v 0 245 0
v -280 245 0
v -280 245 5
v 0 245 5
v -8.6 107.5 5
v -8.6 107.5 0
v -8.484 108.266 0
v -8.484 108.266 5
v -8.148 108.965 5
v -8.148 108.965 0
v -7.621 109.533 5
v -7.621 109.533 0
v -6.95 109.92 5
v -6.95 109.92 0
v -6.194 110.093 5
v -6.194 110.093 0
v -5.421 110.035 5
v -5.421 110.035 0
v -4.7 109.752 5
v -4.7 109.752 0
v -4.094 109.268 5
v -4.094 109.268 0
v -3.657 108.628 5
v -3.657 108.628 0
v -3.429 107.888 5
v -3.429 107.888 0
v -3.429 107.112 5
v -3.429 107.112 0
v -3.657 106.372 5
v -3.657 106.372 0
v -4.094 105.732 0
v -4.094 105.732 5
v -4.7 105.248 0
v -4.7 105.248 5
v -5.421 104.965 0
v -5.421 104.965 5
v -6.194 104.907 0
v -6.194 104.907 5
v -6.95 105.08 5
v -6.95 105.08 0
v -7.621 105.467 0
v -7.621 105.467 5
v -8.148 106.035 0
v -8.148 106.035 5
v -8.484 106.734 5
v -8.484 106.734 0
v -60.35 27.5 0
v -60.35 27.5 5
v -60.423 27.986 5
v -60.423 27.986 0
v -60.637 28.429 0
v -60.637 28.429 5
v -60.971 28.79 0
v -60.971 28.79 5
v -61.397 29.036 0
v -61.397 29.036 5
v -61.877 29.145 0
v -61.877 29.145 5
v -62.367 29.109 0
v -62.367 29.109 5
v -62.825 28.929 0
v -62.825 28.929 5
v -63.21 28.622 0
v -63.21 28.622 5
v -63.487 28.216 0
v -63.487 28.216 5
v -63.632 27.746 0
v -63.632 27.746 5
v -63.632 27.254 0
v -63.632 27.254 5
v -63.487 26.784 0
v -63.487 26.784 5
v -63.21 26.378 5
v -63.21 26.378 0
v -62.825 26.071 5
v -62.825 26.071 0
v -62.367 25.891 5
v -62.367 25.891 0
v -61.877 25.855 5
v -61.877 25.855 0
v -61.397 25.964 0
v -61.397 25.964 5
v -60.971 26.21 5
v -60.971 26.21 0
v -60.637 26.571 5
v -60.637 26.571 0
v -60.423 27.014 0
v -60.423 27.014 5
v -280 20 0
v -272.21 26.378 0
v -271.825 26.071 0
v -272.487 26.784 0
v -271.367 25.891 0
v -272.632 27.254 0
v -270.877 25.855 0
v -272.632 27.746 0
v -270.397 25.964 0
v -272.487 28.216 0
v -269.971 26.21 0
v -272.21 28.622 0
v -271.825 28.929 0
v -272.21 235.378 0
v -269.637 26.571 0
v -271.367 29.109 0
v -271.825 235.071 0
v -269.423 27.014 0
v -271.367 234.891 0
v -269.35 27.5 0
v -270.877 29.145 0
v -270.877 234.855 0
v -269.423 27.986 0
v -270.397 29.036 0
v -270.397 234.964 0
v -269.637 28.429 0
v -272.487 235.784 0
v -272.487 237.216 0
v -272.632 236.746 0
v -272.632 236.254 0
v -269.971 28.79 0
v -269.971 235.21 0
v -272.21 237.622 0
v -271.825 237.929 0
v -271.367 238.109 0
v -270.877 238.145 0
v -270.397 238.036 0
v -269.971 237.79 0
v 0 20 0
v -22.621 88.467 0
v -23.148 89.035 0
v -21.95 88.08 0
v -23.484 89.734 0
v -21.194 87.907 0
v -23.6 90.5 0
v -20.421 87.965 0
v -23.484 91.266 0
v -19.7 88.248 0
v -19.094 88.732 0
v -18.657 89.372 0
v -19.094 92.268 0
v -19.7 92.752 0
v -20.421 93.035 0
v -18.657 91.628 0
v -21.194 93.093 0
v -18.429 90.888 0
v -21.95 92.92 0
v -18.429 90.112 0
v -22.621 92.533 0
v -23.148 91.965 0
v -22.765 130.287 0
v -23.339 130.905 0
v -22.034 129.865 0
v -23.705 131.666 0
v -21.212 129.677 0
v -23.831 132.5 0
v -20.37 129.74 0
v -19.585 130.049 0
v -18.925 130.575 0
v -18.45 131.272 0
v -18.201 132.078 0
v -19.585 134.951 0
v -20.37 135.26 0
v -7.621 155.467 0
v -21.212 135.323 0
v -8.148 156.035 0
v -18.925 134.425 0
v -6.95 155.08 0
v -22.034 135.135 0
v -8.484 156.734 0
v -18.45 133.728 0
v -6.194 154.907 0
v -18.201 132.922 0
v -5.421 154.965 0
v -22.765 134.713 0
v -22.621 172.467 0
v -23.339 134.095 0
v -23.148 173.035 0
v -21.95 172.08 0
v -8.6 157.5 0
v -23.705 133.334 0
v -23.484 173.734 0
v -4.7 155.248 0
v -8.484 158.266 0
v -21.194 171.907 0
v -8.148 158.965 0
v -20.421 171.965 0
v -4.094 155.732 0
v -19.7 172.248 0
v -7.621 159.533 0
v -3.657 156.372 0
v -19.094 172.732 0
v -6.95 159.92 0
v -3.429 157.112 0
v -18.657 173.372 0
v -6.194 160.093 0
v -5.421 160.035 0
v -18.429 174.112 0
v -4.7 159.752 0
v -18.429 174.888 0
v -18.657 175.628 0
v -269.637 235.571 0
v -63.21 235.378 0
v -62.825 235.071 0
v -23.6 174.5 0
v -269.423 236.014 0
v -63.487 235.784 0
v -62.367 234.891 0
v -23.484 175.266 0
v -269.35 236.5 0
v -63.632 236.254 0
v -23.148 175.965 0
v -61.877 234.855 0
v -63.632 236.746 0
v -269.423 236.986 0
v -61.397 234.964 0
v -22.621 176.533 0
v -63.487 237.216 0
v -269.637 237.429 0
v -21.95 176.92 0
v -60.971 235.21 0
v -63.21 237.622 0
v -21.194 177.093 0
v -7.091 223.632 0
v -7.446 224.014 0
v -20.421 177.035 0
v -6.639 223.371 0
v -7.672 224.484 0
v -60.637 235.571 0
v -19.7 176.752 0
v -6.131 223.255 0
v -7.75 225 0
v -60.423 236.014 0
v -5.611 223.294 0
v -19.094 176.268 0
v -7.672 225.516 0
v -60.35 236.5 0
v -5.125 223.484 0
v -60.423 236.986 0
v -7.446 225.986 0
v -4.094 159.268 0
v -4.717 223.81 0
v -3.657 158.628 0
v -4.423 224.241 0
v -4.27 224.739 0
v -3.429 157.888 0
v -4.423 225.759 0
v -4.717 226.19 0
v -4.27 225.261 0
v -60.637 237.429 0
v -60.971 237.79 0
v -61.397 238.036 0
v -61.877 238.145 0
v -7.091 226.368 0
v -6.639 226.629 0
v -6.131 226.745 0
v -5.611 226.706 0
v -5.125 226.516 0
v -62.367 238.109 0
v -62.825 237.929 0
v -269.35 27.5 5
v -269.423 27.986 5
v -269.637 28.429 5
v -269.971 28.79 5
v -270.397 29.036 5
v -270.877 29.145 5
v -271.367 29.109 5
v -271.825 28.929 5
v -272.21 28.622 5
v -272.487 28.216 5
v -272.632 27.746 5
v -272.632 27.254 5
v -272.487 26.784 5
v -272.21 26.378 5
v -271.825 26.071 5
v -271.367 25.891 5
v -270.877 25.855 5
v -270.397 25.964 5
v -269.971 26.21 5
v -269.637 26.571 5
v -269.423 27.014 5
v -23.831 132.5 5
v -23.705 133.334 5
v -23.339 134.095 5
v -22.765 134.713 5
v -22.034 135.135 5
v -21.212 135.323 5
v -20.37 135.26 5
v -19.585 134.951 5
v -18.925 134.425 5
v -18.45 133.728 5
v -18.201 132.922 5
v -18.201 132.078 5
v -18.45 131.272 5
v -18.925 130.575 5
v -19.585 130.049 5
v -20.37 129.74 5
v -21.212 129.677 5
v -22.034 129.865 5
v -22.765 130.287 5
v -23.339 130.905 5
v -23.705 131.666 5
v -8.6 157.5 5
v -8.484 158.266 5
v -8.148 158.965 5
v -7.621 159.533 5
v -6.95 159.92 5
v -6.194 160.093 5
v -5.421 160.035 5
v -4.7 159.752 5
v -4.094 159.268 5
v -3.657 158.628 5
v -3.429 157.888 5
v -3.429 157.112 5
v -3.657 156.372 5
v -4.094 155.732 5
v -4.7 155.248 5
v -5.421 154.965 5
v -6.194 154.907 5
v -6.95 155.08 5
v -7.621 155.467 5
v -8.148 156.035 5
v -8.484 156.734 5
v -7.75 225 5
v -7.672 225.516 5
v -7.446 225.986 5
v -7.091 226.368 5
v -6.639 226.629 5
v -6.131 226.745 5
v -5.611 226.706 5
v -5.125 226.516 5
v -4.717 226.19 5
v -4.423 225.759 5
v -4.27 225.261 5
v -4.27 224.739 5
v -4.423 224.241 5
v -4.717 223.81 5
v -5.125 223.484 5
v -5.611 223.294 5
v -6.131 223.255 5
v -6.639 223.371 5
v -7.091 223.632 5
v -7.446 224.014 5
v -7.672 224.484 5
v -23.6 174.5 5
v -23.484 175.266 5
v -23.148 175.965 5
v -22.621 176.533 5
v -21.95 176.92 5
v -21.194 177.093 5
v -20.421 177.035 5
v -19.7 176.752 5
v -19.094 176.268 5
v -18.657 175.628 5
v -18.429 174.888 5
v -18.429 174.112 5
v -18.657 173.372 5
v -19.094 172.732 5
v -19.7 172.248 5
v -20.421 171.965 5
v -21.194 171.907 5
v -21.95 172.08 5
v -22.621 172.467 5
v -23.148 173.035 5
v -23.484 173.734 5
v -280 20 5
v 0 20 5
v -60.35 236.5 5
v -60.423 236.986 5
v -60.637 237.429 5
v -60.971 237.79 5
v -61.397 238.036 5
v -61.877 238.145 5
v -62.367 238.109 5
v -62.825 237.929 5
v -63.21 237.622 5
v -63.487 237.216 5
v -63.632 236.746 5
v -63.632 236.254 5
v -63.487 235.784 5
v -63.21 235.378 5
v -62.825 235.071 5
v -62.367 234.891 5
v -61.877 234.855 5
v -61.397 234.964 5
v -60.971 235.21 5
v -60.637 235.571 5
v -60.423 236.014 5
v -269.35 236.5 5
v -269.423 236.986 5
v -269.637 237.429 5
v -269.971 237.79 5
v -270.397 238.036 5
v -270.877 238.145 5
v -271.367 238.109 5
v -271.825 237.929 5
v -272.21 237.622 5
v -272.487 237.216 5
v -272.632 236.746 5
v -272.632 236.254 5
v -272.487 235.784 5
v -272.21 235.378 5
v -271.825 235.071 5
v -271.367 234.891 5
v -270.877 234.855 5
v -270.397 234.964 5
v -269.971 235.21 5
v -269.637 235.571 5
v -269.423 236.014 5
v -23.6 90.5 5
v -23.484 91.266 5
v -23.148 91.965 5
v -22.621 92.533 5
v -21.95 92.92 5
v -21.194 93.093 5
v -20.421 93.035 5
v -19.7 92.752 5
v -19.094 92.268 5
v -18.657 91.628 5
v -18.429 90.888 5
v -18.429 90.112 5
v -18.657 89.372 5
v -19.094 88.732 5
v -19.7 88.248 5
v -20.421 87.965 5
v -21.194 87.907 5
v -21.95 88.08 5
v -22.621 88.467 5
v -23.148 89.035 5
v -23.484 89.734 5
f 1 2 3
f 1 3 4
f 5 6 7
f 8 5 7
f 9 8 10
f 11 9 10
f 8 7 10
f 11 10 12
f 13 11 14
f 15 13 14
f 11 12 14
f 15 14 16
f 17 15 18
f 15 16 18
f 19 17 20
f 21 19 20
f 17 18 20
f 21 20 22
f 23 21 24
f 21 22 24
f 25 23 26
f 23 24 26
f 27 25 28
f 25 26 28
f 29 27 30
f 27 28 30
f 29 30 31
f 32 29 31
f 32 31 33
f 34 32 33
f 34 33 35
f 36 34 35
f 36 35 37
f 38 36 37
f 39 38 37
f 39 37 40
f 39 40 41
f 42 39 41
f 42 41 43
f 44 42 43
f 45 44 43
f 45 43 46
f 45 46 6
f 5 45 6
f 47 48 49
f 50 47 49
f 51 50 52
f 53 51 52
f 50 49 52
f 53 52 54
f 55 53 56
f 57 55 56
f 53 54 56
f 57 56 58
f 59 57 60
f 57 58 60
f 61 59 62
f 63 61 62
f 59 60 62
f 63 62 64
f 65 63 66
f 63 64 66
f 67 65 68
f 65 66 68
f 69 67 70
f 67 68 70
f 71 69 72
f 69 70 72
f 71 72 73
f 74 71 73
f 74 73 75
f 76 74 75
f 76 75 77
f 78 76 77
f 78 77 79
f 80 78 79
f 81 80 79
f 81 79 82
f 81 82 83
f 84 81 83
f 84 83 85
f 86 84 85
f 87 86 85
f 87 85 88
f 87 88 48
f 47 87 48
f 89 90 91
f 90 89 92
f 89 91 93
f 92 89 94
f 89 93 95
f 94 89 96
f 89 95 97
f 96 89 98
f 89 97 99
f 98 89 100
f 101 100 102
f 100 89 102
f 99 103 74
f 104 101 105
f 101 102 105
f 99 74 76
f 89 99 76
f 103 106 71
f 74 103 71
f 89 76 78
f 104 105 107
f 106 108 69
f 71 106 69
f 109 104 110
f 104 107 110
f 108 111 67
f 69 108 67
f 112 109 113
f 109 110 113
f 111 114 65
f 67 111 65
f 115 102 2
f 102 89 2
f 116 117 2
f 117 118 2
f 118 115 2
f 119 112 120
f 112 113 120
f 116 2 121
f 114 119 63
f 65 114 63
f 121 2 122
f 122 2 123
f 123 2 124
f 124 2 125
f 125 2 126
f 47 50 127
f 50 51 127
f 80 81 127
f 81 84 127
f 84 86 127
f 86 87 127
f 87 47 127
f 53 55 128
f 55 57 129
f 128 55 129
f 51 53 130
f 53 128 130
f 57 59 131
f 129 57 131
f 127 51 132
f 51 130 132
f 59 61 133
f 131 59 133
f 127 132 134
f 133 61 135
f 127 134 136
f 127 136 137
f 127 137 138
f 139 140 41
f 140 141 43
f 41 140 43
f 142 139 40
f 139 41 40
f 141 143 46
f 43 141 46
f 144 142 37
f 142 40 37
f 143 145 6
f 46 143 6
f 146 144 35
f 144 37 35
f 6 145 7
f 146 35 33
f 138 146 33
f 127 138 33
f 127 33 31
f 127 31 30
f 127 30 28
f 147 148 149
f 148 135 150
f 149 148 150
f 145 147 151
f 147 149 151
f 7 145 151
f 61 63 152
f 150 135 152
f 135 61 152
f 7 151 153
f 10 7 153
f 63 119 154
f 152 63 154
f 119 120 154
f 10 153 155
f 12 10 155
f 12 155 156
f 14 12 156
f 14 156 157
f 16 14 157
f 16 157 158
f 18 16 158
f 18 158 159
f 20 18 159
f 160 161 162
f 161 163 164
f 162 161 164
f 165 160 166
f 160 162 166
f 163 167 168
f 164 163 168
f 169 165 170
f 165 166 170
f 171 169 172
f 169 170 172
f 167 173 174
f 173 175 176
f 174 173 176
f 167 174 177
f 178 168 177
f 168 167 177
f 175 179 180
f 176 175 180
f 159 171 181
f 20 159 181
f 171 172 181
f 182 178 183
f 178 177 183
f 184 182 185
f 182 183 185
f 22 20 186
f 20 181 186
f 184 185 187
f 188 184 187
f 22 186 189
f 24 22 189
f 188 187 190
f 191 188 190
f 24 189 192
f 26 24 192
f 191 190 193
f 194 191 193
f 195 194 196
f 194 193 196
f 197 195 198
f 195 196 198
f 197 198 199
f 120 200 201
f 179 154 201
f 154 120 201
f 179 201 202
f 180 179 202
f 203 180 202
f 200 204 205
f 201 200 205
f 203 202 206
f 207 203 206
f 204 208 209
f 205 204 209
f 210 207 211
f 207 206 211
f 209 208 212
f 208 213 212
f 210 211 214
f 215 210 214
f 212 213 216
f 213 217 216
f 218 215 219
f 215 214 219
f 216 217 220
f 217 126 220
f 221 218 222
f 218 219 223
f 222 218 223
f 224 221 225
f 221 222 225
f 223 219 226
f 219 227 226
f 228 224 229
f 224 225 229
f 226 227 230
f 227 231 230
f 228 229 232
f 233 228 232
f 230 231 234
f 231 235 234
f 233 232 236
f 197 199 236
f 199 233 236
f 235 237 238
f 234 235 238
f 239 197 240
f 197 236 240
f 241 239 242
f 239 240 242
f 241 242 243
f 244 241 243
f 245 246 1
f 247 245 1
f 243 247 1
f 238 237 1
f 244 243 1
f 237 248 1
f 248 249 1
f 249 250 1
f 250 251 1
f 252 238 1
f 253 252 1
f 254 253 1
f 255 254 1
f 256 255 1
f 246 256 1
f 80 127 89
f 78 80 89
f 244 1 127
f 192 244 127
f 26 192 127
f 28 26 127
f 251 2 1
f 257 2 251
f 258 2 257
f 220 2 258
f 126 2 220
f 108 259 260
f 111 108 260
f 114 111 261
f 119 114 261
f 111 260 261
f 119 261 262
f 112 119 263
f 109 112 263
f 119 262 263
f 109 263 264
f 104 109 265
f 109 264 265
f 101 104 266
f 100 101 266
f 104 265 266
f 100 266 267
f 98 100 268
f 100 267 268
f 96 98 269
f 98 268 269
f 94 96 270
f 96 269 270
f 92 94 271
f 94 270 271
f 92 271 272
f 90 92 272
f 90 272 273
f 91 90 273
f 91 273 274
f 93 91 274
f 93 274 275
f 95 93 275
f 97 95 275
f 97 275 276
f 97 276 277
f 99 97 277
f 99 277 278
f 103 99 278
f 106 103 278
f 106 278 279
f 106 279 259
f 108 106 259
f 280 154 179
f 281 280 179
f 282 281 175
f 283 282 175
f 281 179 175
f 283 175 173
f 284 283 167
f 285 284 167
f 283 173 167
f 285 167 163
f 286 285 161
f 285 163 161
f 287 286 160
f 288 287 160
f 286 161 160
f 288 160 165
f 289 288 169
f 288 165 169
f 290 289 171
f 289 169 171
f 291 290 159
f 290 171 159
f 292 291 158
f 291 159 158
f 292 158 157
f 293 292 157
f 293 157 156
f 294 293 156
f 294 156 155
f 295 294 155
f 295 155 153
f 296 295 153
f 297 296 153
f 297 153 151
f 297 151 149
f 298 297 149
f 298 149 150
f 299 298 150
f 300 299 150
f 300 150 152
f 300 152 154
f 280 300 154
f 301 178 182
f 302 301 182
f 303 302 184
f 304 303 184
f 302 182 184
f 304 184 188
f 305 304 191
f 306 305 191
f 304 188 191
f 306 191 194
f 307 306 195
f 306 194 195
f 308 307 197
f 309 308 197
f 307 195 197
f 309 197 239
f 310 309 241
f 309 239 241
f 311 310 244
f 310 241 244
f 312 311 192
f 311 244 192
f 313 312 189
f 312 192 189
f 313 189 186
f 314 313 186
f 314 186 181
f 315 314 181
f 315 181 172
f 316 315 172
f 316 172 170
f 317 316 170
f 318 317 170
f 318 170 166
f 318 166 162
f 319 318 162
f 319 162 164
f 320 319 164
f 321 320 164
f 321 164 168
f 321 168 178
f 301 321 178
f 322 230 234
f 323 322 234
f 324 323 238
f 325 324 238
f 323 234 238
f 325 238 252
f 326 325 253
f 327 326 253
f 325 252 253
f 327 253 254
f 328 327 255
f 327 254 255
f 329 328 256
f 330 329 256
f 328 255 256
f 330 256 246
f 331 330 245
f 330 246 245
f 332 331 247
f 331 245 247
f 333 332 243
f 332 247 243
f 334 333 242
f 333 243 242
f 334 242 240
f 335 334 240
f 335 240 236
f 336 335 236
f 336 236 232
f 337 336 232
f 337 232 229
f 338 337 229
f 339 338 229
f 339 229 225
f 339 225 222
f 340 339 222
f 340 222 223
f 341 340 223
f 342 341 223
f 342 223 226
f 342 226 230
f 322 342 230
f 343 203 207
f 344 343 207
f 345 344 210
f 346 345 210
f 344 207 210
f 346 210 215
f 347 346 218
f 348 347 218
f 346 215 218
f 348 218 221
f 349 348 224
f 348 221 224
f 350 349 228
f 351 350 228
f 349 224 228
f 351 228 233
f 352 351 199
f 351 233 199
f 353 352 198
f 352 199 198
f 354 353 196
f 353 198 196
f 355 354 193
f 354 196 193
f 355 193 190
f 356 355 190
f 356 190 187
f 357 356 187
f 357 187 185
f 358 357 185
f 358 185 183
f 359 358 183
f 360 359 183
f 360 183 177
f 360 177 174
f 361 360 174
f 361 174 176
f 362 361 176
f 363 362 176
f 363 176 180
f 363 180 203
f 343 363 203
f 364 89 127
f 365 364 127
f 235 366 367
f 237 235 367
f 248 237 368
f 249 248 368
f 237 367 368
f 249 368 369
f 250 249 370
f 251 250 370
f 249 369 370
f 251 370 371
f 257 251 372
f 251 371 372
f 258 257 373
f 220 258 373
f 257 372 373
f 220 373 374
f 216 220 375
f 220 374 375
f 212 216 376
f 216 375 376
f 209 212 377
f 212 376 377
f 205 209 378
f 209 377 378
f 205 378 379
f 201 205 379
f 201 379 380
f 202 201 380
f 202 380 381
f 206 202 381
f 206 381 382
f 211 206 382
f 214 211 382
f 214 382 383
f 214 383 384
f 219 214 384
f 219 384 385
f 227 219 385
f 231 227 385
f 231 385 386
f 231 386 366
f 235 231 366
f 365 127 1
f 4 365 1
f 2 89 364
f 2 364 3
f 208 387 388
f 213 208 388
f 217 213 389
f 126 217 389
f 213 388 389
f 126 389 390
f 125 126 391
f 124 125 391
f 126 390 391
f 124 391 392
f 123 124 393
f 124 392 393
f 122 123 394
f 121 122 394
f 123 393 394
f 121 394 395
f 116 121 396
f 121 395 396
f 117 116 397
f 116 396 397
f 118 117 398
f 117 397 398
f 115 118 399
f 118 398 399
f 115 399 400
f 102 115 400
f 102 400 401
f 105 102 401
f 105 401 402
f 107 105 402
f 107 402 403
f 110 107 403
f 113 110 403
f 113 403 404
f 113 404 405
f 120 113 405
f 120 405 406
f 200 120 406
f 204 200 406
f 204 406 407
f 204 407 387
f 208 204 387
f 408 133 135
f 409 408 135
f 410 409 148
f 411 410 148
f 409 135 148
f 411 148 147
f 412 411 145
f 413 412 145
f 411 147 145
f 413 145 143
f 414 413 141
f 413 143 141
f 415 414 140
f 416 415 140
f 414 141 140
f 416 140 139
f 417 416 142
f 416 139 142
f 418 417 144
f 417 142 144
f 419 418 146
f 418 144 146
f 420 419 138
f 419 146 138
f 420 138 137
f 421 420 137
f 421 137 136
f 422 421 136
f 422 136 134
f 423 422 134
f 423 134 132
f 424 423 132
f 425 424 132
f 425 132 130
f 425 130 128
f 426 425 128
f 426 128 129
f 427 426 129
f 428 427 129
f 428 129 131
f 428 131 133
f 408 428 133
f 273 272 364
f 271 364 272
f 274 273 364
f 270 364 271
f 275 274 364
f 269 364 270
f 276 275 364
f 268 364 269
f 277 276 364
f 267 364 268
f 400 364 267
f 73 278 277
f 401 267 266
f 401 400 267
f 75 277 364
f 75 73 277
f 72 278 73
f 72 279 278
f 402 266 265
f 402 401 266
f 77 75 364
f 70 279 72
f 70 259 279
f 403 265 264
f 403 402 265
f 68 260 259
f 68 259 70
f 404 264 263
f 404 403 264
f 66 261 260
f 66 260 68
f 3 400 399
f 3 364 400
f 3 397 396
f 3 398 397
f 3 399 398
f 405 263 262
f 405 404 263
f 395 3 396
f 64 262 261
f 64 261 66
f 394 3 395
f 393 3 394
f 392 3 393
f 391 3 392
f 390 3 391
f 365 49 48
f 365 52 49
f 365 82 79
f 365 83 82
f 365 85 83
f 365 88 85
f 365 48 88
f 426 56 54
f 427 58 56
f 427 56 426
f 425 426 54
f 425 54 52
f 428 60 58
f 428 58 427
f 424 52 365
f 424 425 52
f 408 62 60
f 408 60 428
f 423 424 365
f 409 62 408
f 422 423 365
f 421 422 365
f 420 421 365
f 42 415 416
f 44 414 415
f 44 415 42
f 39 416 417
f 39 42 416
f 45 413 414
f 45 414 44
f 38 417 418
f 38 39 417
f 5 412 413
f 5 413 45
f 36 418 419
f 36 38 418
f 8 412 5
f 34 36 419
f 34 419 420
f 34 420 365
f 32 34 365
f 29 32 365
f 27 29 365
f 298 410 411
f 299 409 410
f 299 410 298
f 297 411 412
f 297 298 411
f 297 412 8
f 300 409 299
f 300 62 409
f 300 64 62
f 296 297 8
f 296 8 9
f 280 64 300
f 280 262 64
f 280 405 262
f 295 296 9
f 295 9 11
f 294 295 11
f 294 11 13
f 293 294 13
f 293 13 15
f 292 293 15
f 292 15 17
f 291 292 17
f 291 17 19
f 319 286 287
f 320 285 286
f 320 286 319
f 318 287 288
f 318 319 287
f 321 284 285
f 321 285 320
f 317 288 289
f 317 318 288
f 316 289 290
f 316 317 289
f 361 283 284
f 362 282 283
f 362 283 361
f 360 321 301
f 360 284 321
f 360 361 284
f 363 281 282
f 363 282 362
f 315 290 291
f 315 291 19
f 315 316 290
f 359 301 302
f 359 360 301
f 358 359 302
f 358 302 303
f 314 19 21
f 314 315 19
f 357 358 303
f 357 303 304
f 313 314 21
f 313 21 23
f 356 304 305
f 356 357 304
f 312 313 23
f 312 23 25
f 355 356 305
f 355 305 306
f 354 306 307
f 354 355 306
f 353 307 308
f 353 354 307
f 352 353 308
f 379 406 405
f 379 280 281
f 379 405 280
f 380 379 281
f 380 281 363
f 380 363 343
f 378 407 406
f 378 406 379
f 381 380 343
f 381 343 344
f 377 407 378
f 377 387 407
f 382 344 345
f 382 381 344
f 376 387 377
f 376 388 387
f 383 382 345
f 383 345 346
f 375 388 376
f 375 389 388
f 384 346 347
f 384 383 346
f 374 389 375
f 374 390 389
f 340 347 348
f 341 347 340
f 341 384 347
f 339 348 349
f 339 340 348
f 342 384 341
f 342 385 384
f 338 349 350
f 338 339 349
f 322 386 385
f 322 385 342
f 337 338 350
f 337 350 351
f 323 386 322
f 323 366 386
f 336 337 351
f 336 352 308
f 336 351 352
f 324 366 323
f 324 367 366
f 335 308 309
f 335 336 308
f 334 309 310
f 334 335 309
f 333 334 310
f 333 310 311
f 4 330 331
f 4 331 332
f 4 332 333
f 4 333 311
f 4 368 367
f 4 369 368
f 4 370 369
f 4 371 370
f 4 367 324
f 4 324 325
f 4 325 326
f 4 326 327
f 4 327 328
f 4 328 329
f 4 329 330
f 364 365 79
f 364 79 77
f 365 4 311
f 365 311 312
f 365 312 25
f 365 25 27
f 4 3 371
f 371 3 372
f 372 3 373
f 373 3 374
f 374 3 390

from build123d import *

# Parameters (mm, degrees)
SCHIZZO1_W                   = 280
SCHIZZO1_H                   = 225
ESTRUSIONE_ESTRUSIONE1_DEPTH = 5
FORO_FILETTATO_M4_1_D        = 3.3
FORO_FILETTATO_M4_1_DEPTH    = 5
SCHIZZO12_R                  = 2.6
SCHIZZO12_R_2                = 2.830640445
SCHIZZO12_R_3                = 1.75
TAGLIO_ESTRUSIONE1_DEPTH     = 10


with BuildPart() as part:
    # Schizzo1 → Estrusione-Estrusione1 (new body)
    with BuildSketch(Plane.XY):
        with Locations((-140, 132.5)):
            Rectangle(SCHIZZO1_W, SCHIZZO1_H)
    extrude(amount=ESTRUSIONE_ESTRUSIONE1_DEPTH)

    # Foro filettato M4-1
    with Locations(Plane(origin=(0, 0, 0), x_dir=(-1, 0, 0), z_dir=(0, 0, -1))):
        with Locations((271, 27.5), (62, 27.5), (271, 236.5), (62, 236.5)):
            Hole(FORO_FILETTATO_M4_1_D / 2, depth=FORO_FILETTATO_M4_1_DEPTH)

    # Schizzo12 → Taglio-Estrusione1 (cut)
    with BuildSketch(Plane(origin=(0, 0, 0), x_dir=(-1, 0, 0), z_dir=(0, 0, -1))):
        with Locations((6, 107.5)):
            Circle(SCHIZZO12_R)
        with Locations((6, 157.5)):
            Circle(SCHIZZO12_R)
        with Locations((21, 90.5)):
            Circle(SCHIZZO12_R)
        with Locations((21, 132.5)):
            Circle(SCHIZZO12_R_2)
        with Locations((21, 174.5)):
            Circle(SCHIZZO12_R)
        with Locations((6, 225)):
            Circle(SCHIZZO12_R_3)
    extrude(amount=-TAGLIO_ESTRUSIONE1_DEPTH, mode=Mode.SUBTRACT)


solid = part.part
